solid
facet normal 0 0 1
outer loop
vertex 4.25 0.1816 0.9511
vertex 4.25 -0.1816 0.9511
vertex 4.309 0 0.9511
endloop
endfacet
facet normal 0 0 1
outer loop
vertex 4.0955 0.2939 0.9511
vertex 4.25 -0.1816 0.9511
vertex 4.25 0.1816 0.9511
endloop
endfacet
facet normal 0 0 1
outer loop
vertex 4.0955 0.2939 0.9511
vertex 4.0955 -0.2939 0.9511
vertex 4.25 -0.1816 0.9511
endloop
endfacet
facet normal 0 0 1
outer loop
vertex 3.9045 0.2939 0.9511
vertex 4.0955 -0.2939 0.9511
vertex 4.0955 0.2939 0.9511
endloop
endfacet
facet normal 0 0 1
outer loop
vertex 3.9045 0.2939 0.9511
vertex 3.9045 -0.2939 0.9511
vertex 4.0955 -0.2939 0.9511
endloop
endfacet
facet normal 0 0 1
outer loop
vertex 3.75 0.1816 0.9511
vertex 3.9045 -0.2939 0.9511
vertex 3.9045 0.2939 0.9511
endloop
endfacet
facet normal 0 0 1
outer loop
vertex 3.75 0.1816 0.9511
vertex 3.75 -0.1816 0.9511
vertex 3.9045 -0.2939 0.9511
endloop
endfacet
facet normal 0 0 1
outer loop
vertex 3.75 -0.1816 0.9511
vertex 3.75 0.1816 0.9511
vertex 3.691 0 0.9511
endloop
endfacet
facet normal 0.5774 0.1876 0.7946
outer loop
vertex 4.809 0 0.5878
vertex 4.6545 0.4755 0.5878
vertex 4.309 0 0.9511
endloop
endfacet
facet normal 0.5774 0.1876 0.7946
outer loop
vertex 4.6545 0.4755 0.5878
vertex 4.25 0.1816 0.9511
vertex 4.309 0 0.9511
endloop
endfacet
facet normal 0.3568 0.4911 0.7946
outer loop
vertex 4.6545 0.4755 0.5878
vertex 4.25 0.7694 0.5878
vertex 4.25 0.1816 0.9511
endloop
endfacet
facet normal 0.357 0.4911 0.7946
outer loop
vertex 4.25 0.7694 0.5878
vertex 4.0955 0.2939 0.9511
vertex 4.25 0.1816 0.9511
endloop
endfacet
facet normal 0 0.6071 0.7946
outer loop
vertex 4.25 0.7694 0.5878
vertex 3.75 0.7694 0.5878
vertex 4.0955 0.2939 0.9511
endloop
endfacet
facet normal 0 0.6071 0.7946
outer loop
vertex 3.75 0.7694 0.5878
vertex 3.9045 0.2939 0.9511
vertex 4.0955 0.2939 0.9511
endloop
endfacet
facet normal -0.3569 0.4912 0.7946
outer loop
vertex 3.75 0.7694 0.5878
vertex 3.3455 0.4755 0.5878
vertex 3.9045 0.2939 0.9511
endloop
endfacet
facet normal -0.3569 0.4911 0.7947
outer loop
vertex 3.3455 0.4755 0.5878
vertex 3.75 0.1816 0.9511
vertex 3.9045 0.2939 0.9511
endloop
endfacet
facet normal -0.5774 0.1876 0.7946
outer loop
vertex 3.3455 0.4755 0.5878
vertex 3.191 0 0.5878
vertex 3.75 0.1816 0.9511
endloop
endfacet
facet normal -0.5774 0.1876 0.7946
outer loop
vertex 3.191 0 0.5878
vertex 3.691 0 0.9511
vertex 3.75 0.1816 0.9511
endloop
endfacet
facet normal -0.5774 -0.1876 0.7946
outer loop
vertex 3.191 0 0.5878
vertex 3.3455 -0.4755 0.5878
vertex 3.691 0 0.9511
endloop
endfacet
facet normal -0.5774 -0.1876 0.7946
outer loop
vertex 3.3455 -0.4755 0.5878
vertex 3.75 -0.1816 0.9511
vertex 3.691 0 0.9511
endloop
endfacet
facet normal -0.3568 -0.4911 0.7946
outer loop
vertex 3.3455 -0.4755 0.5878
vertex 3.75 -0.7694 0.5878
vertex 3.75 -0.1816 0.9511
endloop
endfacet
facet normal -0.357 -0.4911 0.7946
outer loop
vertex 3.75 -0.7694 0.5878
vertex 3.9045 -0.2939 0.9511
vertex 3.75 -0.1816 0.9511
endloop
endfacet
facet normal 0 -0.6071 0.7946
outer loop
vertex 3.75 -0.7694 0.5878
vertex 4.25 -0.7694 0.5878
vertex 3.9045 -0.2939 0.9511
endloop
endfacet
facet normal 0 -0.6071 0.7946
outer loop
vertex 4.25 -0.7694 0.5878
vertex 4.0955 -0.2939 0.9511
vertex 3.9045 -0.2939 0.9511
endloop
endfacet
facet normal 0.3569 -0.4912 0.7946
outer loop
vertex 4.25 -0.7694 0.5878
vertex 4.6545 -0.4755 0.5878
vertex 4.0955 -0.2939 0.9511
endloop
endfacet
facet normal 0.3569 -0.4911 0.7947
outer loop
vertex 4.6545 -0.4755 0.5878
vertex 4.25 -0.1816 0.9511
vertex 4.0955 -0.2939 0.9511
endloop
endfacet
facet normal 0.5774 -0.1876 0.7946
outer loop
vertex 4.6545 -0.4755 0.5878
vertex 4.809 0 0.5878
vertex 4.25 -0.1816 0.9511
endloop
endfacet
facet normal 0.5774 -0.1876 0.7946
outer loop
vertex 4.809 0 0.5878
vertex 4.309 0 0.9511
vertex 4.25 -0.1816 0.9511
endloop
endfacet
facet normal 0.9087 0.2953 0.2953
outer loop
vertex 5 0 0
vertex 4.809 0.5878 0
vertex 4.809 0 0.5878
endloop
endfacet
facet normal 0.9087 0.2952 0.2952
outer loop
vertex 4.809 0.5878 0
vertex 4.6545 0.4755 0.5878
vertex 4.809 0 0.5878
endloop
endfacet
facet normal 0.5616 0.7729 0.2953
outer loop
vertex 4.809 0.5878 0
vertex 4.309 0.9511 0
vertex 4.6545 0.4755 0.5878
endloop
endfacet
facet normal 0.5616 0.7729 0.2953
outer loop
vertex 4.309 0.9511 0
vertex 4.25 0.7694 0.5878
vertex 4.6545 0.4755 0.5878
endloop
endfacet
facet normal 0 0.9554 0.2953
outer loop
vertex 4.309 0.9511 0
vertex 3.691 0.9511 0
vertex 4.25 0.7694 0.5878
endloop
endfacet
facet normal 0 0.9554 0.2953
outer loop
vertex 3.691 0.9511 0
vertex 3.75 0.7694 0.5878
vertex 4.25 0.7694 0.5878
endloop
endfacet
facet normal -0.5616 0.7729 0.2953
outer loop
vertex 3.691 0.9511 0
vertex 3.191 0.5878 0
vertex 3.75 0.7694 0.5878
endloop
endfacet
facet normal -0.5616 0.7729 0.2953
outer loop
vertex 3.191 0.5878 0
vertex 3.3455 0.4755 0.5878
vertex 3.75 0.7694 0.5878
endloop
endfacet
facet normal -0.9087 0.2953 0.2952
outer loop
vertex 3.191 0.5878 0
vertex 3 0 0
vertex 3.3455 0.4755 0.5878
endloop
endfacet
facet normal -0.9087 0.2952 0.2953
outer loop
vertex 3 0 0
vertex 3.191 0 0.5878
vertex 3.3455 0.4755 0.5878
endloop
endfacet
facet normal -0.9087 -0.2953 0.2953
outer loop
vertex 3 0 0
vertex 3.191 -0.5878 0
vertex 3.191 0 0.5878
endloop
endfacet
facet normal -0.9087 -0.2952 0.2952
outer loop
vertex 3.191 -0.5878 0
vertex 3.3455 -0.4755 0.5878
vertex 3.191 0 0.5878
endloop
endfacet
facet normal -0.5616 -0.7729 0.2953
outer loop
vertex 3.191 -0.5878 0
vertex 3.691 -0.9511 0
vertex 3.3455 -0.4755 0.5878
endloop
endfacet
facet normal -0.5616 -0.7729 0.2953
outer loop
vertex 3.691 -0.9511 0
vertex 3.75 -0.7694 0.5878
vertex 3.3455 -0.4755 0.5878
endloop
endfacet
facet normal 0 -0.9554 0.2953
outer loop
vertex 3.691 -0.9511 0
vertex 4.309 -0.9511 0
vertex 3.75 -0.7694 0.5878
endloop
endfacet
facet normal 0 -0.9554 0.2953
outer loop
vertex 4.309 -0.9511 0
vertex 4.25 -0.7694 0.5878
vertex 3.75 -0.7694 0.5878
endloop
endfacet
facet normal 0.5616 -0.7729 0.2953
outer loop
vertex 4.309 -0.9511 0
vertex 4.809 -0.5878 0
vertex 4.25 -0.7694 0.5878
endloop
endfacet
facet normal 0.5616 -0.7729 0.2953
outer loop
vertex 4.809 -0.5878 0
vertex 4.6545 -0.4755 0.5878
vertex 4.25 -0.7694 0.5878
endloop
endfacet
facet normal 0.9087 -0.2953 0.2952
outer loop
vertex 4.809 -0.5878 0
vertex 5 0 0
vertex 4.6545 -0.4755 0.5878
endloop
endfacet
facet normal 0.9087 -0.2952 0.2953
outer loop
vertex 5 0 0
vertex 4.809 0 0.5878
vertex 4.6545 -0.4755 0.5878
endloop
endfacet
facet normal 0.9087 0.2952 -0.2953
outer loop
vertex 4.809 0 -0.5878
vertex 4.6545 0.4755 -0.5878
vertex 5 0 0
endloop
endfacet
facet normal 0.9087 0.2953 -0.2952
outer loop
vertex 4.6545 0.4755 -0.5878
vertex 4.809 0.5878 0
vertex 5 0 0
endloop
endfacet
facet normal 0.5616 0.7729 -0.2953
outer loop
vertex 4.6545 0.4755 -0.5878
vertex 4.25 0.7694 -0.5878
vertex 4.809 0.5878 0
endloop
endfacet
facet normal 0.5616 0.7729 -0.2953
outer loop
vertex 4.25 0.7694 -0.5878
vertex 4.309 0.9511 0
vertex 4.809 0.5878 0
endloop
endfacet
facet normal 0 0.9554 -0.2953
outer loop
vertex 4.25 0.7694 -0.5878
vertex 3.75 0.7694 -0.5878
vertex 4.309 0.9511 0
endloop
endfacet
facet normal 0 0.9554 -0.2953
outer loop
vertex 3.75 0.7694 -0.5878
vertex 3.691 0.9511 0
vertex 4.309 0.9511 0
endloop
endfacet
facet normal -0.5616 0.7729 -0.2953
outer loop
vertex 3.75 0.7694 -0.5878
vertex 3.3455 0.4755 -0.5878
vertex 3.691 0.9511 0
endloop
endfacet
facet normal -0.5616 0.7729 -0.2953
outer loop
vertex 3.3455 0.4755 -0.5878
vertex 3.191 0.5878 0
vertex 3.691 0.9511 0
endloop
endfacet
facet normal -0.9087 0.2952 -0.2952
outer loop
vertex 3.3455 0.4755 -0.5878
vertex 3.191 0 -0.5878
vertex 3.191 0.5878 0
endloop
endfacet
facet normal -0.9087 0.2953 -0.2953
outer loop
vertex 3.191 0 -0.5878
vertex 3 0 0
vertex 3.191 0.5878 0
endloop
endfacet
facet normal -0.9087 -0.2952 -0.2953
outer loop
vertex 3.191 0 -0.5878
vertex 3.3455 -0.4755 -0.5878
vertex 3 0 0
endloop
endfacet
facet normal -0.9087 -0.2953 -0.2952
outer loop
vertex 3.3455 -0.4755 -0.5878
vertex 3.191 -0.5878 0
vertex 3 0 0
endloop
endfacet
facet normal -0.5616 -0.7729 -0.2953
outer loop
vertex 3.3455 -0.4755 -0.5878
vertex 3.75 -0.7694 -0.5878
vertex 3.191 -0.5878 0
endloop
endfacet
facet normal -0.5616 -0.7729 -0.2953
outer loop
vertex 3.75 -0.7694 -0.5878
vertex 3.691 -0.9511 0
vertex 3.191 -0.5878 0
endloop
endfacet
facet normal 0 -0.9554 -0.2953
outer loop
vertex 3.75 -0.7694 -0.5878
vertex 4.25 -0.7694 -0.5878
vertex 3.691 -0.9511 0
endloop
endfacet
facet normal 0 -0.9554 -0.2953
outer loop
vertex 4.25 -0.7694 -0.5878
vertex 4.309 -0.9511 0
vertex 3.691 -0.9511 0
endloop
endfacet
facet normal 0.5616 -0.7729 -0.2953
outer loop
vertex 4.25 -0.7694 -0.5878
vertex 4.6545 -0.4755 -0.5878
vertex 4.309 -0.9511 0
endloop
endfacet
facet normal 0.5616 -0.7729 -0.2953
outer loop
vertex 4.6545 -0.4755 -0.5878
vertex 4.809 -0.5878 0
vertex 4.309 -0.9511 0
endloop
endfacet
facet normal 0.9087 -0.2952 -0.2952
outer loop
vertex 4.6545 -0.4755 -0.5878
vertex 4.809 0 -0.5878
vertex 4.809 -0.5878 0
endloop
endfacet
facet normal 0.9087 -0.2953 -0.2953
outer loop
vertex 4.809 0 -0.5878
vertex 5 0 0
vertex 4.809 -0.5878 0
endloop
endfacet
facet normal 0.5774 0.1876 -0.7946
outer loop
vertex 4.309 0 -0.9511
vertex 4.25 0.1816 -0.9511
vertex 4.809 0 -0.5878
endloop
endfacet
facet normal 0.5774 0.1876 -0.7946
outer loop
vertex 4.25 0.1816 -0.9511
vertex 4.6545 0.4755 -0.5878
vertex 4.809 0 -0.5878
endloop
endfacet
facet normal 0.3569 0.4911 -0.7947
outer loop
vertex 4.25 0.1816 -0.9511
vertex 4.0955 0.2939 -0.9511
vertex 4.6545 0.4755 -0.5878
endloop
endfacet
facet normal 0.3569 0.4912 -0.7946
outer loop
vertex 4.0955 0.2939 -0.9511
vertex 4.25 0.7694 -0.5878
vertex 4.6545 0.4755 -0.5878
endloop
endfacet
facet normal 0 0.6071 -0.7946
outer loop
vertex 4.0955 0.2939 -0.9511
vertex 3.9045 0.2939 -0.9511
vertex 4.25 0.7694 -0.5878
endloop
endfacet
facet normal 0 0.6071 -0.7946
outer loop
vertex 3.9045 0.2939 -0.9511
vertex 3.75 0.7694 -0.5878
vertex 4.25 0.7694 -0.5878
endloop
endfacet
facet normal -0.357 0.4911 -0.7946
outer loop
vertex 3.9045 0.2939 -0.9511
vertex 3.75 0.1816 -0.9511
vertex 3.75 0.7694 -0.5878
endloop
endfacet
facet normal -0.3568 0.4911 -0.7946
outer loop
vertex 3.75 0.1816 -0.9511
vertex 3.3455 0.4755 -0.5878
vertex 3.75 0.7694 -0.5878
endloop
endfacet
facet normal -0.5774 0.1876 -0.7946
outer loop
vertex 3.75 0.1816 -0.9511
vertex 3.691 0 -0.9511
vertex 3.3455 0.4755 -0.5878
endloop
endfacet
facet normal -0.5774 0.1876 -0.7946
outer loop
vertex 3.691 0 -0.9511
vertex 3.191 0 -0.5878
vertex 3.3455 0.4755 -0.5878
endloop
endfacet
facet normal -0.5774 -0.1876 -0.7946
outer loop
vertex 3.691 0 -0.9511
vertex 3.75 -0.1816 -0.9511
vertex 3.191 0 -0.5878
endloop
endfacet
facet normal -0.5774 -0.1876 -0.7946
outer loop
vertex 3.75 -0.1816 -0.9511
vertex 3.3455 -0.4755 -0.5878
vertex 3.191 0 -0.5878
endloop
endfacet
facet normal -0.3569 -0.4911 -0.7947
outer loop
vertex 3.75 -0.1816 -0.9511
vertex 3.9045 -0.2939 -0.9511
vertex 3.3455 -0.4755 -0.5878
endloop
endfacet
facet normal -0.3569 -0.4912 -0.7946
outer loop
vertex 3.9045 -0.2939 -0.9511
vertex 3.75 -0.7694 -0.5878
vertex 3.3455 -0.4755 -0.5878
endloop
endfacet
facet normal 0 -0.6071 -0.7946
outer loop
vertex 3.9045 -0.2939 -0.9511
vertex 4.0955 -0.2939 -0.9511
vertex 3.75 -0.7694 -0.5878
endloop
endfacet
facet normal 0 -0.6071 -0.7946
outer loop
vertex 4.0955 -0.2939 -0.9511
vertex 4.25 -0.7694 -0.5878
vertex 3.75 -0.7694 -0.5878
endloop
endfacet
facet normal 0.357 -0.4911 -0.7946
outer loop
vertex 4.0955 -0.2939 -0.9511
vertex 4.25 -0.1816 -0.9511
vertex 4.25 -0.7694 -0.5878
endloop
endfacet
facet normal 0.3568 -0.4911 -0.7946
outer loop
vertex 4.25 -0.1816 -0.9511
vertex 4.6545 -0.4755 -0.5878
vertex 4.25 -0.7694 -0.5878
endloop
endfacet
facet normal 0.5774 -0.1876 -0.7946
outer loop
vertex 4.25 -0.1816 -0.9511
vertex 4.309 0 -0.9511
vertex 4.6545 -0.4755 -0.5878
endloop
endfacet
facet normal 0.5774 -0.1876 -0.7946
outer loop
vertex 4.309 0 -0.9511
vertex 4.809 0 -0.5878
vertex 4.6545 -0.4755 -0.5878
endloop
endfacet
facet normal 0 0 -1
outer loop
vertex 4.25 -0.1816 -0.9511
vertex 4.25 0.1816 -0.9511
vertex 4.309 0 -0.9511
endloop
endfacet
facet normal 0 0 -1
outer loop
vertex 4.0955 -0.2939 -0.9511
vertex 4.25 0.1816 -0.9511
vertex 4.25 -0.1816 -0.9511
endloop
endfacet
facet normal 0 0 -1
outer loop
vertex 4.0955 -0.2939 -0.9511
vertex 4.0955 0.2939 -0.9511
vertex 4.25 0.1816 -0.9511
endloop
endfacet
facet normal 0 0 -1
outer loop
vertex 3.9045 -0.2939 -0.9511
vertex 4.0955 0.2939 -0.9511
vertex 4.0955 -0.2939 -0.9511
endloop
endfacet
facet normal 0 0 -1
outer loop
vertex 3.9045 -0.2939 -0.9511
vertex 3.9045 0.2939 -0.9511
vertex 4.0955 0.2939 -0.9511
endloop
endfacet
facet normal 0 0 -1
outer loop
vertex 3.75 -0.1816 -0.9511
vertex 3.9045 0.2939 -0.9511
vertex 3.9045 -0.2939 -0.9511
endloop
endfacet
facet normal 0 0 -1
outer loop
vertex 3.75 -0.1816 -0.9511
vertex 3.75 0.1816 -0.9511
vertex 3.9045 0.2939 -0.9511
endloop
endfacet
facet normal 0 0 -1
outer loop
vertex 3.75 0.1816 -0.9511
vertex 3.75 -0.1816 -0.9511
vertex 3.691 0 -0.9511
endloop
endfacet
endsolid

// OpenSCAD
// % removes the object from the result
%cube(3);
translate([4, 0, 0]) sphere(1, $fn = 10);
